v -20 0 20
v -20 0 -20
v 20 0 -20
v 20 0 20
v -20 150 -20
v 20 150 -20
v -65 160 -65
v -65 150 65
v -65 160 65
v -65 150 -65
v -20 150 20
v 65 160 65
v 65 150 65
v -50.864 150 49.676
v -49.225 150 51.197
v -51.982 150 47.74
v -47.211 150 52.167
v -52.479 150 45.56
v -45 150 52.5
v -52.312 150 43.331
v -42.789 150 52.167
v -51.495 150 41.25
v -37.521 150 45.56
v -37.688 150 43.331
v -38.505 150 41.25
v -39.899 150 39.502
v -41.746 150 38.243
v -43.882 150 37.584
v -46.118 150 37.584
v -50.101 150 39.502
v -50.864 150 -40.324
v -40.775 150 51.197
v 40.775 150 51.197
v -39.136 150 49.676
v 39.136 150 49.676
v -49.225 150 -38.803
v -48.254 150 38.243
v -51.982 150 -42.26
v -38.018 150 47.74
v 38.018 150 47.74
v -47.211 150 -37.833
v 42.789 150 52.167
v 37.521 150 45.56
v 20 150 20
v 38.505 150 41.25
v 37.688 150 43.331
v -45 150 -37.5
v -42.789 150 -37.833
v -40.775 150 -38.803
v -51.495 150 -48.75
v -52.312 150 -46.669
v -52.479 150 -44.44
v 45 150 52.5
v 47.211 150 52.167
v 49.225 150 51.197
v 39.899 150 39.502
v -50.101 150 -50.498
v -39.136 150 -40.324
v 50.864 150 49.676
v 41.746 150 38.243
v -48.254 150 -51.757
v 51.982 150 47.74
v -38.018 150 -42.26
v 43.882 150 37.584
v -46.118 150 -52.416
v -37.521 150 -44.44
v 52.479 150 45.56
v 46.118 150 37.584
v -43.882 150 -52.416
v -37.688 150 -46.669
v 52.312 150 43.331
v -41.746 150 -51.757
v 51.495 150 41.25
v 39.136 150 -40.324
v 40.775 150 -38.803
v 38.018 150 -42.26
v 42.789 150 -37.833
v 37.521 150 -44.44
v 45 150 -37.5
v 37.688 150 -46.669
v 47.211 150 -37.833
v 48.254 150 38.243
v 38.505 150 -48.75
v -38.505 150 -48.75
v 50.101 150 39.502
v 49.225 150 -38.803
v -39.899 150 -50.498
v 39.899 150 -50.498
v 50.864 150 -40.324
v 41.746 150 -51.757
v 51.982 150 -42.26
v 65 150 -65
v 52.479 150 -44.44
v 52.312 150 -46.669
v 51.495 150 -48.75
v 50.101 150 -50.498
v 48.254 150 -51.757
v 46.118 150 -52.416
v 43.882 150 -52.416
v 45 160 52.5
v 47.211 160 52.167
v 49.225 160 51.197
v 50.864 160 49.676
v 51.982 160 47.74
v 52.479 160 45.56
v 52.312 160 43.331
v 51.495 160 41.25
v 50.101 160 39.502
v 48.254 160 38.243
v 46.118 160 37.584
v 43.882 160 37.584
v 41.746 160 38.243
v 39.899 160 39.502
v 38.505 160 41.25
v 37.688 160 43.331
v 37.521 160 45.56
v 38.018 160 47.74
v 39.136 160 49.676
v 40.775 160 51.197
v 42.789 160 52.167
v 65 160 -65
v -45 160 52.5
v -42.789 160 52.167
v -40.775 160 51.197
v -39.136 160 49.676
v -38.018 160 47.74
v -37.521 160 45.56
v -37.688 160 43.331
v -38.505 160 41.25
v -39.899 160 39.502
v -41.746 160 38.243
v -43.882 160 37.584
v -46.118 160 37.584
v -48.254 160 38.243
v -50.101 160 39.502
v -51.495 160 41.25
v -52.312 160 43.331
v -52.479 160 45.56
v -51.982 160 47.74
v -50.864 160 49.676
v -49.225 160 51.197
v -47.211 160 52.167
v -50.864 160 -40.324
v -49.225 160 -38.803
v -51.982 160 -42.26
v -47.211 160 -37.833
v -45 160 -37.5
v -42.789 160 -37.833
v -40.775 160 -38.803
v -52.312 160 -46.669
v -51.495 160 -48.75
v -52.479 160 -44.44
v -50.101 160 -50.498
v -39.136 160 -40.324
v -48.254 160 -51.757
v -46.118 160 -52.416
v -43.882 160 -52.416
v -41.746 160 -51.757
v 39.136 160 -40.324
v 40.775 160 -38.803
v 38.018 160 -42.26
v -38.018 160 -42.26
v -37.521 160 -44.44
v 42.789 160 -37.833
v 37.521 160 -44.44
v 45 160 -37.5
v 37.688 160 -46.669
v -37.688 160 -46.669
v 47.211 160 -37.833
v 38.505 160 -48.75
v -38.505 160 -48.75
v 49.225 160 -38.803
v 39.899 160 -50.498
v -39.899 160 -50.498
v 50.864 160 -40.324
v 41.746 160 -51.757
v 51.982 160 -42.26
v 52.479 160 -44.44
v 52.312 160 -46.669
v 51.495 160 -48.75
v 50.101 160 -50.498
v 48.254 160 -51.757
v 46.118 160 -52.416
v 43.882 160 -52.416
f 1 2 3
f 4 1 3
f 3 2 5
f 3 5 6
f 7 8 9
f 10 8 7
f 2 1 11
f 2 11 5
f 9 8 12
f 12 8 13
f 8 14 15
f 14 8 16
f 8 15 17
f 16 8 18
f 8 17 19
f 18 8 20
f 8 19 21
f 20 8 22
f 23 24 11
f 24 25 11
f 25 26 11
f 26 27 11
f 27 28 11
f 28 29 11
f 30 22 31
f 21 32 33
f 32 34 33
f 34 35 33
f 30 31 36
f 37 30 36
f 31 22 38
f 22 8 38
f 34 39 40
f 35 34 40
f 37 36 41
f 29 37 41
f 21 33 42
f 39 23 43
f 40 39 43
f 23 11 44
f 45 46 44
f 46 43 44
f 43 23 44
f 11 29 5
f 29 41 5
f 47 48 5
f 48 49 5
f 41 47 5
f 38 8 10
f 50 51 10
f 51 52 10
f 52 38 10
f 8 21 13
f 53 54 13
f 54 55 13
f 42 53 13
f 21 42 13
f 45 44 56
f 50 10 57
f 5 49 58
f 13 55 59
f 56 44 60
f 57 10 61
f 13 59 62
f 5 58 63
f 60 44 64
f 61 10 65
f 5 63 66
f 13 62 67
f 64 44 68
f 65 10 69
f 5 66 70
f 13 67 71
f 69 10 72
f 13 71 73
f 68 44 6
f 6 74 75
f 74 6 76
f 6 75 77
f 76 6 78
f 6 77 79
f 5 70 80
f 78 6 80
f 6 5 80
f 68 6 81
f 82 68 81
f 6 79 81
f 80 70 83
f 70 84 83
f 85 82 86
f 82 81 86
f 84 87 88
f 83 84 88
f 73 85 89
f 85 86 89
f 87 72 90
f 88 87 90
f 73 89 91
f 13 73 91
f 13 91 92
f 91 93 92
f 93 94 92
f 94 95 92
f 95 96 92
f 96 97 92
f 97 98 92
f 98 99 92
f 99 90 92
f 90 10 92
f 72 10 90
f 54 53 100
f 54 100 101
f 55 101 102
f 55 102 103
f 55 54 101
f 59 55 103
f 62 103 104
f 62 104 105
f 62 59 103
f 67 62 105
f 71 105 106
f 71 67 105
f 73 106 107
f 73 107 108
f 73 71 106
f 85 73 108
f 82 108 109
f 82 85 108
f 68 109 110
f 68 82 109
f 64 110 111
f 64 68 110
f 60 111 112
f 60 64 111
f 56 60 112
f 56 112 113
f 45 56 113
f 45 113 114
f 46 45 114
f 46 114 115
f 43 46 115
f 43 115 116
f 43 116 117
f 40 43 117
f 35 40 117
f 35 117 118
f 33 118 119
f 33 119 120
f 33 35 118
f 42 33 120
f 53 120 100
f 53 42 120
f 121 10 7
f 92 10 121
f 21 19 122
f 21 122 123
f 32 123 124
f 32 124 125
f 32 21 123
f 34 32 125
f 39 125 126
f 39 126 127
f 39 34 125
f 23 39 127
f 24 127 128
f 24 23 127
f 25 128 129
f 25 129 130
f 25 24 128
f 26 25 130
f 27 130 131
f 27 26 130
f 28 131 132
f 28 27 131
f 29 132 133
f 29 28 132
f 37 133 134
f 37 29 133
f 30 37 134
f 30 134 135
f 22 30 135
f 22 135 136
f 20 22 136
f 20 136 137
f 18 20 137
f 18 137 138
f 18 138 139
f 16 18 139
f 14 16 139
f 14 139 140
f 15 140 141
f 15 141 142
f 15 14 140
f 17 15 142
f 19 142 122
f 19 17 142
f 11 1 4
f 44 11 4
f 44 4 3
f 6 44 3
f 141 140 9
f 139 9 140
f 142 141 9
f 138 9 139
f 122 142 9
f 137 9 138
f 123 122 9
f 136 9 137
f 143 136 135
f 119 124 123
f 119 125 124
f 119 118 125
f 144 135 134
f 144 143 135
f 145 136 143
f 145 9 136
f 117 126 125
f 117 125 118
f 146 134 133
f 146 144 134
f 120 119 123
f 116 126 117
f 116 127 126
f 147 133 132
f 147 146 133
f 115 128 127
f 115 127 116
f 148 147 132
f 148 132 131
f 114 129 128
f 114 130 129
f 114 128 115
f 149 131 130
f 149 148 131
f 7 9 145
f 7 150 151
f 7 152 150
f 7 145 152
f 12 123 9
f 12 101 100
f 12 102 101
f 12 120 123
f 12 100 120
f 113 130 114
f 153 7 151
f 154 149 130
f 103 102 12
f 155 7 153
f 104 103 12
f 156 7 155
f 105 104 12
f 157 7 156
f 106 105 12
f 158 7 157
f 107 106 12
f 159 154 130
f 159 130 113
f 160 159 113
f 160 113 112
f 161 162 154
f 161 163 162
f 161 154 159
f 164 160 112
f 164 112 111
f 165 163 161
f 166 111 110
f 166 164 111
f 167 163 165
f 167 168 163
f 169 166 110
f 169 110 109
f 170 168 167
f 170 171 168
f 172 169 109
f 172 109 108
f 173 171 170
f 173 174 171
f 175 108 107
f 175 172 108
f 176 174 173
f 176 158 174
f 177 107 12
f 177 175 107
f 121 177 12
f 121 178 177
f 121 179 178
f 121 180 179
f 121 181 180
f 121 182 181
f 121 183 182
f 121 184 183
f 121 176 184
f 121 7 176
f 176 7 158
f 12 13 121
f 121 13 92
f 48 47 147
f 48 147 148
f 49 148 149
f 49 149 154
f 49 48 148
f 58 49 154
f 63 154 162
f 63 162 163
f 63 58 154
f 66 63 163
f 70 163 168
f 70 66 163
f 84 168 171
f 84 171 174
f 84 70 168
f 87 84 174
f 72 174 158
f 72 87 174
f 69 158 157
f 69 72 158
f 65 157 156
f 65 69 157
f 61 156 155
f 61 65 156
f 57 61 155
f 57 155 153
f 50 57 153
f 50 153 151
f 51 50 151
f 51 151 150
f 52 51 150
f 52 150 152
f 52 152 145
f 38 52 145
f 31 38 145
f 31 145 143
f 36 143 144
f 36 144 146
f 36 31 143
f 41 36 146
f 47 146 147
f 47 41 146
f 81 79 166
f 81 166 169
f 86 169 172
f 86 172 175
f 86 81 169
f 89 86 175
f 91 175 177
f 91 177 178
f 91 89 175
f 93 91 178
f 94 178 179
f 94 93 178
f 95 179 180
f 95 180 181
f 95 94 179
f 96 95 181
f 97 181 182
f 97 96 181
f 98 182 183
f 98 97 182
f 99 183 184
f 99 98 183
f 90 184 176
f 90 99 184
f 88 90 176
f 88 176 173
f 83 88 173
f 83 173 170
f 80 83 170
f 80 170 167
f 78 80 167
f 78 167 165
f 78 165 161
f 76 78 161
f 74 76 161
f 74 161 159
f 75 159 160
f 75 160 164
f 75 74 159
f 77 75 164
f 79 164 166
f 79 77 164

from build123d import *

# Parameters (mm, degrees)
SKETCH1_W           = 40
SKETCH1_H           = 40
BOSS_EXTRUDE1_DEPTH = 150
SKETCH2_W           = 130
SKETCH2_H           = 130
SKETCH2_R           = 7.5
BOSS_EXTRUDE2_DEPTH = 10


with BuildPart() as part:
    # Sketch1 → Boss-Extrude1 (new body)
    with BuildSketch(Plane(origin=(0, 0, 0), x_dir=(1, 0, 0), z_dir=(0, 1, 0))):
        Rectangle(SKETCH1_W, SKETCH1_H)
    extrude(amount=BOSS_EXTRUDE1_DEPTH)

    # Sketch2 → Boss-Extrude2 (add)
    with BuildSketch(Plane(origin=(0, 150, 0), x_dir=(1, 0, 0), z_dir=(0, 1, 0))):
        Rectangle(SKETCH2_W, SKETCH2_H)
        with Locations(Location((-45, -45, 0), (0, 0, 270))):
            Circle(SKETCH2_R, mode=Mode.SUBTRACT)
        with Locations(Location((45, -45, 0), (0, 0, 270))):
            Circle(SKETCH2_R, mode=Mode.SUBTRACT)
        with Locations(Location((45, 45, 0), (0, 0, 270))):
            Circle(SKETCH2_R, mode=Mode.SUBTRACT)
        with Locations(Location((-45, 45, 0), (0, 0, 270))):
            Circle(SKETCH2_R, mode=Mode.SUBTRACT)
    extrude(amount=BOSS_EXTRUDE2_DEPTH)


solid = part.part
